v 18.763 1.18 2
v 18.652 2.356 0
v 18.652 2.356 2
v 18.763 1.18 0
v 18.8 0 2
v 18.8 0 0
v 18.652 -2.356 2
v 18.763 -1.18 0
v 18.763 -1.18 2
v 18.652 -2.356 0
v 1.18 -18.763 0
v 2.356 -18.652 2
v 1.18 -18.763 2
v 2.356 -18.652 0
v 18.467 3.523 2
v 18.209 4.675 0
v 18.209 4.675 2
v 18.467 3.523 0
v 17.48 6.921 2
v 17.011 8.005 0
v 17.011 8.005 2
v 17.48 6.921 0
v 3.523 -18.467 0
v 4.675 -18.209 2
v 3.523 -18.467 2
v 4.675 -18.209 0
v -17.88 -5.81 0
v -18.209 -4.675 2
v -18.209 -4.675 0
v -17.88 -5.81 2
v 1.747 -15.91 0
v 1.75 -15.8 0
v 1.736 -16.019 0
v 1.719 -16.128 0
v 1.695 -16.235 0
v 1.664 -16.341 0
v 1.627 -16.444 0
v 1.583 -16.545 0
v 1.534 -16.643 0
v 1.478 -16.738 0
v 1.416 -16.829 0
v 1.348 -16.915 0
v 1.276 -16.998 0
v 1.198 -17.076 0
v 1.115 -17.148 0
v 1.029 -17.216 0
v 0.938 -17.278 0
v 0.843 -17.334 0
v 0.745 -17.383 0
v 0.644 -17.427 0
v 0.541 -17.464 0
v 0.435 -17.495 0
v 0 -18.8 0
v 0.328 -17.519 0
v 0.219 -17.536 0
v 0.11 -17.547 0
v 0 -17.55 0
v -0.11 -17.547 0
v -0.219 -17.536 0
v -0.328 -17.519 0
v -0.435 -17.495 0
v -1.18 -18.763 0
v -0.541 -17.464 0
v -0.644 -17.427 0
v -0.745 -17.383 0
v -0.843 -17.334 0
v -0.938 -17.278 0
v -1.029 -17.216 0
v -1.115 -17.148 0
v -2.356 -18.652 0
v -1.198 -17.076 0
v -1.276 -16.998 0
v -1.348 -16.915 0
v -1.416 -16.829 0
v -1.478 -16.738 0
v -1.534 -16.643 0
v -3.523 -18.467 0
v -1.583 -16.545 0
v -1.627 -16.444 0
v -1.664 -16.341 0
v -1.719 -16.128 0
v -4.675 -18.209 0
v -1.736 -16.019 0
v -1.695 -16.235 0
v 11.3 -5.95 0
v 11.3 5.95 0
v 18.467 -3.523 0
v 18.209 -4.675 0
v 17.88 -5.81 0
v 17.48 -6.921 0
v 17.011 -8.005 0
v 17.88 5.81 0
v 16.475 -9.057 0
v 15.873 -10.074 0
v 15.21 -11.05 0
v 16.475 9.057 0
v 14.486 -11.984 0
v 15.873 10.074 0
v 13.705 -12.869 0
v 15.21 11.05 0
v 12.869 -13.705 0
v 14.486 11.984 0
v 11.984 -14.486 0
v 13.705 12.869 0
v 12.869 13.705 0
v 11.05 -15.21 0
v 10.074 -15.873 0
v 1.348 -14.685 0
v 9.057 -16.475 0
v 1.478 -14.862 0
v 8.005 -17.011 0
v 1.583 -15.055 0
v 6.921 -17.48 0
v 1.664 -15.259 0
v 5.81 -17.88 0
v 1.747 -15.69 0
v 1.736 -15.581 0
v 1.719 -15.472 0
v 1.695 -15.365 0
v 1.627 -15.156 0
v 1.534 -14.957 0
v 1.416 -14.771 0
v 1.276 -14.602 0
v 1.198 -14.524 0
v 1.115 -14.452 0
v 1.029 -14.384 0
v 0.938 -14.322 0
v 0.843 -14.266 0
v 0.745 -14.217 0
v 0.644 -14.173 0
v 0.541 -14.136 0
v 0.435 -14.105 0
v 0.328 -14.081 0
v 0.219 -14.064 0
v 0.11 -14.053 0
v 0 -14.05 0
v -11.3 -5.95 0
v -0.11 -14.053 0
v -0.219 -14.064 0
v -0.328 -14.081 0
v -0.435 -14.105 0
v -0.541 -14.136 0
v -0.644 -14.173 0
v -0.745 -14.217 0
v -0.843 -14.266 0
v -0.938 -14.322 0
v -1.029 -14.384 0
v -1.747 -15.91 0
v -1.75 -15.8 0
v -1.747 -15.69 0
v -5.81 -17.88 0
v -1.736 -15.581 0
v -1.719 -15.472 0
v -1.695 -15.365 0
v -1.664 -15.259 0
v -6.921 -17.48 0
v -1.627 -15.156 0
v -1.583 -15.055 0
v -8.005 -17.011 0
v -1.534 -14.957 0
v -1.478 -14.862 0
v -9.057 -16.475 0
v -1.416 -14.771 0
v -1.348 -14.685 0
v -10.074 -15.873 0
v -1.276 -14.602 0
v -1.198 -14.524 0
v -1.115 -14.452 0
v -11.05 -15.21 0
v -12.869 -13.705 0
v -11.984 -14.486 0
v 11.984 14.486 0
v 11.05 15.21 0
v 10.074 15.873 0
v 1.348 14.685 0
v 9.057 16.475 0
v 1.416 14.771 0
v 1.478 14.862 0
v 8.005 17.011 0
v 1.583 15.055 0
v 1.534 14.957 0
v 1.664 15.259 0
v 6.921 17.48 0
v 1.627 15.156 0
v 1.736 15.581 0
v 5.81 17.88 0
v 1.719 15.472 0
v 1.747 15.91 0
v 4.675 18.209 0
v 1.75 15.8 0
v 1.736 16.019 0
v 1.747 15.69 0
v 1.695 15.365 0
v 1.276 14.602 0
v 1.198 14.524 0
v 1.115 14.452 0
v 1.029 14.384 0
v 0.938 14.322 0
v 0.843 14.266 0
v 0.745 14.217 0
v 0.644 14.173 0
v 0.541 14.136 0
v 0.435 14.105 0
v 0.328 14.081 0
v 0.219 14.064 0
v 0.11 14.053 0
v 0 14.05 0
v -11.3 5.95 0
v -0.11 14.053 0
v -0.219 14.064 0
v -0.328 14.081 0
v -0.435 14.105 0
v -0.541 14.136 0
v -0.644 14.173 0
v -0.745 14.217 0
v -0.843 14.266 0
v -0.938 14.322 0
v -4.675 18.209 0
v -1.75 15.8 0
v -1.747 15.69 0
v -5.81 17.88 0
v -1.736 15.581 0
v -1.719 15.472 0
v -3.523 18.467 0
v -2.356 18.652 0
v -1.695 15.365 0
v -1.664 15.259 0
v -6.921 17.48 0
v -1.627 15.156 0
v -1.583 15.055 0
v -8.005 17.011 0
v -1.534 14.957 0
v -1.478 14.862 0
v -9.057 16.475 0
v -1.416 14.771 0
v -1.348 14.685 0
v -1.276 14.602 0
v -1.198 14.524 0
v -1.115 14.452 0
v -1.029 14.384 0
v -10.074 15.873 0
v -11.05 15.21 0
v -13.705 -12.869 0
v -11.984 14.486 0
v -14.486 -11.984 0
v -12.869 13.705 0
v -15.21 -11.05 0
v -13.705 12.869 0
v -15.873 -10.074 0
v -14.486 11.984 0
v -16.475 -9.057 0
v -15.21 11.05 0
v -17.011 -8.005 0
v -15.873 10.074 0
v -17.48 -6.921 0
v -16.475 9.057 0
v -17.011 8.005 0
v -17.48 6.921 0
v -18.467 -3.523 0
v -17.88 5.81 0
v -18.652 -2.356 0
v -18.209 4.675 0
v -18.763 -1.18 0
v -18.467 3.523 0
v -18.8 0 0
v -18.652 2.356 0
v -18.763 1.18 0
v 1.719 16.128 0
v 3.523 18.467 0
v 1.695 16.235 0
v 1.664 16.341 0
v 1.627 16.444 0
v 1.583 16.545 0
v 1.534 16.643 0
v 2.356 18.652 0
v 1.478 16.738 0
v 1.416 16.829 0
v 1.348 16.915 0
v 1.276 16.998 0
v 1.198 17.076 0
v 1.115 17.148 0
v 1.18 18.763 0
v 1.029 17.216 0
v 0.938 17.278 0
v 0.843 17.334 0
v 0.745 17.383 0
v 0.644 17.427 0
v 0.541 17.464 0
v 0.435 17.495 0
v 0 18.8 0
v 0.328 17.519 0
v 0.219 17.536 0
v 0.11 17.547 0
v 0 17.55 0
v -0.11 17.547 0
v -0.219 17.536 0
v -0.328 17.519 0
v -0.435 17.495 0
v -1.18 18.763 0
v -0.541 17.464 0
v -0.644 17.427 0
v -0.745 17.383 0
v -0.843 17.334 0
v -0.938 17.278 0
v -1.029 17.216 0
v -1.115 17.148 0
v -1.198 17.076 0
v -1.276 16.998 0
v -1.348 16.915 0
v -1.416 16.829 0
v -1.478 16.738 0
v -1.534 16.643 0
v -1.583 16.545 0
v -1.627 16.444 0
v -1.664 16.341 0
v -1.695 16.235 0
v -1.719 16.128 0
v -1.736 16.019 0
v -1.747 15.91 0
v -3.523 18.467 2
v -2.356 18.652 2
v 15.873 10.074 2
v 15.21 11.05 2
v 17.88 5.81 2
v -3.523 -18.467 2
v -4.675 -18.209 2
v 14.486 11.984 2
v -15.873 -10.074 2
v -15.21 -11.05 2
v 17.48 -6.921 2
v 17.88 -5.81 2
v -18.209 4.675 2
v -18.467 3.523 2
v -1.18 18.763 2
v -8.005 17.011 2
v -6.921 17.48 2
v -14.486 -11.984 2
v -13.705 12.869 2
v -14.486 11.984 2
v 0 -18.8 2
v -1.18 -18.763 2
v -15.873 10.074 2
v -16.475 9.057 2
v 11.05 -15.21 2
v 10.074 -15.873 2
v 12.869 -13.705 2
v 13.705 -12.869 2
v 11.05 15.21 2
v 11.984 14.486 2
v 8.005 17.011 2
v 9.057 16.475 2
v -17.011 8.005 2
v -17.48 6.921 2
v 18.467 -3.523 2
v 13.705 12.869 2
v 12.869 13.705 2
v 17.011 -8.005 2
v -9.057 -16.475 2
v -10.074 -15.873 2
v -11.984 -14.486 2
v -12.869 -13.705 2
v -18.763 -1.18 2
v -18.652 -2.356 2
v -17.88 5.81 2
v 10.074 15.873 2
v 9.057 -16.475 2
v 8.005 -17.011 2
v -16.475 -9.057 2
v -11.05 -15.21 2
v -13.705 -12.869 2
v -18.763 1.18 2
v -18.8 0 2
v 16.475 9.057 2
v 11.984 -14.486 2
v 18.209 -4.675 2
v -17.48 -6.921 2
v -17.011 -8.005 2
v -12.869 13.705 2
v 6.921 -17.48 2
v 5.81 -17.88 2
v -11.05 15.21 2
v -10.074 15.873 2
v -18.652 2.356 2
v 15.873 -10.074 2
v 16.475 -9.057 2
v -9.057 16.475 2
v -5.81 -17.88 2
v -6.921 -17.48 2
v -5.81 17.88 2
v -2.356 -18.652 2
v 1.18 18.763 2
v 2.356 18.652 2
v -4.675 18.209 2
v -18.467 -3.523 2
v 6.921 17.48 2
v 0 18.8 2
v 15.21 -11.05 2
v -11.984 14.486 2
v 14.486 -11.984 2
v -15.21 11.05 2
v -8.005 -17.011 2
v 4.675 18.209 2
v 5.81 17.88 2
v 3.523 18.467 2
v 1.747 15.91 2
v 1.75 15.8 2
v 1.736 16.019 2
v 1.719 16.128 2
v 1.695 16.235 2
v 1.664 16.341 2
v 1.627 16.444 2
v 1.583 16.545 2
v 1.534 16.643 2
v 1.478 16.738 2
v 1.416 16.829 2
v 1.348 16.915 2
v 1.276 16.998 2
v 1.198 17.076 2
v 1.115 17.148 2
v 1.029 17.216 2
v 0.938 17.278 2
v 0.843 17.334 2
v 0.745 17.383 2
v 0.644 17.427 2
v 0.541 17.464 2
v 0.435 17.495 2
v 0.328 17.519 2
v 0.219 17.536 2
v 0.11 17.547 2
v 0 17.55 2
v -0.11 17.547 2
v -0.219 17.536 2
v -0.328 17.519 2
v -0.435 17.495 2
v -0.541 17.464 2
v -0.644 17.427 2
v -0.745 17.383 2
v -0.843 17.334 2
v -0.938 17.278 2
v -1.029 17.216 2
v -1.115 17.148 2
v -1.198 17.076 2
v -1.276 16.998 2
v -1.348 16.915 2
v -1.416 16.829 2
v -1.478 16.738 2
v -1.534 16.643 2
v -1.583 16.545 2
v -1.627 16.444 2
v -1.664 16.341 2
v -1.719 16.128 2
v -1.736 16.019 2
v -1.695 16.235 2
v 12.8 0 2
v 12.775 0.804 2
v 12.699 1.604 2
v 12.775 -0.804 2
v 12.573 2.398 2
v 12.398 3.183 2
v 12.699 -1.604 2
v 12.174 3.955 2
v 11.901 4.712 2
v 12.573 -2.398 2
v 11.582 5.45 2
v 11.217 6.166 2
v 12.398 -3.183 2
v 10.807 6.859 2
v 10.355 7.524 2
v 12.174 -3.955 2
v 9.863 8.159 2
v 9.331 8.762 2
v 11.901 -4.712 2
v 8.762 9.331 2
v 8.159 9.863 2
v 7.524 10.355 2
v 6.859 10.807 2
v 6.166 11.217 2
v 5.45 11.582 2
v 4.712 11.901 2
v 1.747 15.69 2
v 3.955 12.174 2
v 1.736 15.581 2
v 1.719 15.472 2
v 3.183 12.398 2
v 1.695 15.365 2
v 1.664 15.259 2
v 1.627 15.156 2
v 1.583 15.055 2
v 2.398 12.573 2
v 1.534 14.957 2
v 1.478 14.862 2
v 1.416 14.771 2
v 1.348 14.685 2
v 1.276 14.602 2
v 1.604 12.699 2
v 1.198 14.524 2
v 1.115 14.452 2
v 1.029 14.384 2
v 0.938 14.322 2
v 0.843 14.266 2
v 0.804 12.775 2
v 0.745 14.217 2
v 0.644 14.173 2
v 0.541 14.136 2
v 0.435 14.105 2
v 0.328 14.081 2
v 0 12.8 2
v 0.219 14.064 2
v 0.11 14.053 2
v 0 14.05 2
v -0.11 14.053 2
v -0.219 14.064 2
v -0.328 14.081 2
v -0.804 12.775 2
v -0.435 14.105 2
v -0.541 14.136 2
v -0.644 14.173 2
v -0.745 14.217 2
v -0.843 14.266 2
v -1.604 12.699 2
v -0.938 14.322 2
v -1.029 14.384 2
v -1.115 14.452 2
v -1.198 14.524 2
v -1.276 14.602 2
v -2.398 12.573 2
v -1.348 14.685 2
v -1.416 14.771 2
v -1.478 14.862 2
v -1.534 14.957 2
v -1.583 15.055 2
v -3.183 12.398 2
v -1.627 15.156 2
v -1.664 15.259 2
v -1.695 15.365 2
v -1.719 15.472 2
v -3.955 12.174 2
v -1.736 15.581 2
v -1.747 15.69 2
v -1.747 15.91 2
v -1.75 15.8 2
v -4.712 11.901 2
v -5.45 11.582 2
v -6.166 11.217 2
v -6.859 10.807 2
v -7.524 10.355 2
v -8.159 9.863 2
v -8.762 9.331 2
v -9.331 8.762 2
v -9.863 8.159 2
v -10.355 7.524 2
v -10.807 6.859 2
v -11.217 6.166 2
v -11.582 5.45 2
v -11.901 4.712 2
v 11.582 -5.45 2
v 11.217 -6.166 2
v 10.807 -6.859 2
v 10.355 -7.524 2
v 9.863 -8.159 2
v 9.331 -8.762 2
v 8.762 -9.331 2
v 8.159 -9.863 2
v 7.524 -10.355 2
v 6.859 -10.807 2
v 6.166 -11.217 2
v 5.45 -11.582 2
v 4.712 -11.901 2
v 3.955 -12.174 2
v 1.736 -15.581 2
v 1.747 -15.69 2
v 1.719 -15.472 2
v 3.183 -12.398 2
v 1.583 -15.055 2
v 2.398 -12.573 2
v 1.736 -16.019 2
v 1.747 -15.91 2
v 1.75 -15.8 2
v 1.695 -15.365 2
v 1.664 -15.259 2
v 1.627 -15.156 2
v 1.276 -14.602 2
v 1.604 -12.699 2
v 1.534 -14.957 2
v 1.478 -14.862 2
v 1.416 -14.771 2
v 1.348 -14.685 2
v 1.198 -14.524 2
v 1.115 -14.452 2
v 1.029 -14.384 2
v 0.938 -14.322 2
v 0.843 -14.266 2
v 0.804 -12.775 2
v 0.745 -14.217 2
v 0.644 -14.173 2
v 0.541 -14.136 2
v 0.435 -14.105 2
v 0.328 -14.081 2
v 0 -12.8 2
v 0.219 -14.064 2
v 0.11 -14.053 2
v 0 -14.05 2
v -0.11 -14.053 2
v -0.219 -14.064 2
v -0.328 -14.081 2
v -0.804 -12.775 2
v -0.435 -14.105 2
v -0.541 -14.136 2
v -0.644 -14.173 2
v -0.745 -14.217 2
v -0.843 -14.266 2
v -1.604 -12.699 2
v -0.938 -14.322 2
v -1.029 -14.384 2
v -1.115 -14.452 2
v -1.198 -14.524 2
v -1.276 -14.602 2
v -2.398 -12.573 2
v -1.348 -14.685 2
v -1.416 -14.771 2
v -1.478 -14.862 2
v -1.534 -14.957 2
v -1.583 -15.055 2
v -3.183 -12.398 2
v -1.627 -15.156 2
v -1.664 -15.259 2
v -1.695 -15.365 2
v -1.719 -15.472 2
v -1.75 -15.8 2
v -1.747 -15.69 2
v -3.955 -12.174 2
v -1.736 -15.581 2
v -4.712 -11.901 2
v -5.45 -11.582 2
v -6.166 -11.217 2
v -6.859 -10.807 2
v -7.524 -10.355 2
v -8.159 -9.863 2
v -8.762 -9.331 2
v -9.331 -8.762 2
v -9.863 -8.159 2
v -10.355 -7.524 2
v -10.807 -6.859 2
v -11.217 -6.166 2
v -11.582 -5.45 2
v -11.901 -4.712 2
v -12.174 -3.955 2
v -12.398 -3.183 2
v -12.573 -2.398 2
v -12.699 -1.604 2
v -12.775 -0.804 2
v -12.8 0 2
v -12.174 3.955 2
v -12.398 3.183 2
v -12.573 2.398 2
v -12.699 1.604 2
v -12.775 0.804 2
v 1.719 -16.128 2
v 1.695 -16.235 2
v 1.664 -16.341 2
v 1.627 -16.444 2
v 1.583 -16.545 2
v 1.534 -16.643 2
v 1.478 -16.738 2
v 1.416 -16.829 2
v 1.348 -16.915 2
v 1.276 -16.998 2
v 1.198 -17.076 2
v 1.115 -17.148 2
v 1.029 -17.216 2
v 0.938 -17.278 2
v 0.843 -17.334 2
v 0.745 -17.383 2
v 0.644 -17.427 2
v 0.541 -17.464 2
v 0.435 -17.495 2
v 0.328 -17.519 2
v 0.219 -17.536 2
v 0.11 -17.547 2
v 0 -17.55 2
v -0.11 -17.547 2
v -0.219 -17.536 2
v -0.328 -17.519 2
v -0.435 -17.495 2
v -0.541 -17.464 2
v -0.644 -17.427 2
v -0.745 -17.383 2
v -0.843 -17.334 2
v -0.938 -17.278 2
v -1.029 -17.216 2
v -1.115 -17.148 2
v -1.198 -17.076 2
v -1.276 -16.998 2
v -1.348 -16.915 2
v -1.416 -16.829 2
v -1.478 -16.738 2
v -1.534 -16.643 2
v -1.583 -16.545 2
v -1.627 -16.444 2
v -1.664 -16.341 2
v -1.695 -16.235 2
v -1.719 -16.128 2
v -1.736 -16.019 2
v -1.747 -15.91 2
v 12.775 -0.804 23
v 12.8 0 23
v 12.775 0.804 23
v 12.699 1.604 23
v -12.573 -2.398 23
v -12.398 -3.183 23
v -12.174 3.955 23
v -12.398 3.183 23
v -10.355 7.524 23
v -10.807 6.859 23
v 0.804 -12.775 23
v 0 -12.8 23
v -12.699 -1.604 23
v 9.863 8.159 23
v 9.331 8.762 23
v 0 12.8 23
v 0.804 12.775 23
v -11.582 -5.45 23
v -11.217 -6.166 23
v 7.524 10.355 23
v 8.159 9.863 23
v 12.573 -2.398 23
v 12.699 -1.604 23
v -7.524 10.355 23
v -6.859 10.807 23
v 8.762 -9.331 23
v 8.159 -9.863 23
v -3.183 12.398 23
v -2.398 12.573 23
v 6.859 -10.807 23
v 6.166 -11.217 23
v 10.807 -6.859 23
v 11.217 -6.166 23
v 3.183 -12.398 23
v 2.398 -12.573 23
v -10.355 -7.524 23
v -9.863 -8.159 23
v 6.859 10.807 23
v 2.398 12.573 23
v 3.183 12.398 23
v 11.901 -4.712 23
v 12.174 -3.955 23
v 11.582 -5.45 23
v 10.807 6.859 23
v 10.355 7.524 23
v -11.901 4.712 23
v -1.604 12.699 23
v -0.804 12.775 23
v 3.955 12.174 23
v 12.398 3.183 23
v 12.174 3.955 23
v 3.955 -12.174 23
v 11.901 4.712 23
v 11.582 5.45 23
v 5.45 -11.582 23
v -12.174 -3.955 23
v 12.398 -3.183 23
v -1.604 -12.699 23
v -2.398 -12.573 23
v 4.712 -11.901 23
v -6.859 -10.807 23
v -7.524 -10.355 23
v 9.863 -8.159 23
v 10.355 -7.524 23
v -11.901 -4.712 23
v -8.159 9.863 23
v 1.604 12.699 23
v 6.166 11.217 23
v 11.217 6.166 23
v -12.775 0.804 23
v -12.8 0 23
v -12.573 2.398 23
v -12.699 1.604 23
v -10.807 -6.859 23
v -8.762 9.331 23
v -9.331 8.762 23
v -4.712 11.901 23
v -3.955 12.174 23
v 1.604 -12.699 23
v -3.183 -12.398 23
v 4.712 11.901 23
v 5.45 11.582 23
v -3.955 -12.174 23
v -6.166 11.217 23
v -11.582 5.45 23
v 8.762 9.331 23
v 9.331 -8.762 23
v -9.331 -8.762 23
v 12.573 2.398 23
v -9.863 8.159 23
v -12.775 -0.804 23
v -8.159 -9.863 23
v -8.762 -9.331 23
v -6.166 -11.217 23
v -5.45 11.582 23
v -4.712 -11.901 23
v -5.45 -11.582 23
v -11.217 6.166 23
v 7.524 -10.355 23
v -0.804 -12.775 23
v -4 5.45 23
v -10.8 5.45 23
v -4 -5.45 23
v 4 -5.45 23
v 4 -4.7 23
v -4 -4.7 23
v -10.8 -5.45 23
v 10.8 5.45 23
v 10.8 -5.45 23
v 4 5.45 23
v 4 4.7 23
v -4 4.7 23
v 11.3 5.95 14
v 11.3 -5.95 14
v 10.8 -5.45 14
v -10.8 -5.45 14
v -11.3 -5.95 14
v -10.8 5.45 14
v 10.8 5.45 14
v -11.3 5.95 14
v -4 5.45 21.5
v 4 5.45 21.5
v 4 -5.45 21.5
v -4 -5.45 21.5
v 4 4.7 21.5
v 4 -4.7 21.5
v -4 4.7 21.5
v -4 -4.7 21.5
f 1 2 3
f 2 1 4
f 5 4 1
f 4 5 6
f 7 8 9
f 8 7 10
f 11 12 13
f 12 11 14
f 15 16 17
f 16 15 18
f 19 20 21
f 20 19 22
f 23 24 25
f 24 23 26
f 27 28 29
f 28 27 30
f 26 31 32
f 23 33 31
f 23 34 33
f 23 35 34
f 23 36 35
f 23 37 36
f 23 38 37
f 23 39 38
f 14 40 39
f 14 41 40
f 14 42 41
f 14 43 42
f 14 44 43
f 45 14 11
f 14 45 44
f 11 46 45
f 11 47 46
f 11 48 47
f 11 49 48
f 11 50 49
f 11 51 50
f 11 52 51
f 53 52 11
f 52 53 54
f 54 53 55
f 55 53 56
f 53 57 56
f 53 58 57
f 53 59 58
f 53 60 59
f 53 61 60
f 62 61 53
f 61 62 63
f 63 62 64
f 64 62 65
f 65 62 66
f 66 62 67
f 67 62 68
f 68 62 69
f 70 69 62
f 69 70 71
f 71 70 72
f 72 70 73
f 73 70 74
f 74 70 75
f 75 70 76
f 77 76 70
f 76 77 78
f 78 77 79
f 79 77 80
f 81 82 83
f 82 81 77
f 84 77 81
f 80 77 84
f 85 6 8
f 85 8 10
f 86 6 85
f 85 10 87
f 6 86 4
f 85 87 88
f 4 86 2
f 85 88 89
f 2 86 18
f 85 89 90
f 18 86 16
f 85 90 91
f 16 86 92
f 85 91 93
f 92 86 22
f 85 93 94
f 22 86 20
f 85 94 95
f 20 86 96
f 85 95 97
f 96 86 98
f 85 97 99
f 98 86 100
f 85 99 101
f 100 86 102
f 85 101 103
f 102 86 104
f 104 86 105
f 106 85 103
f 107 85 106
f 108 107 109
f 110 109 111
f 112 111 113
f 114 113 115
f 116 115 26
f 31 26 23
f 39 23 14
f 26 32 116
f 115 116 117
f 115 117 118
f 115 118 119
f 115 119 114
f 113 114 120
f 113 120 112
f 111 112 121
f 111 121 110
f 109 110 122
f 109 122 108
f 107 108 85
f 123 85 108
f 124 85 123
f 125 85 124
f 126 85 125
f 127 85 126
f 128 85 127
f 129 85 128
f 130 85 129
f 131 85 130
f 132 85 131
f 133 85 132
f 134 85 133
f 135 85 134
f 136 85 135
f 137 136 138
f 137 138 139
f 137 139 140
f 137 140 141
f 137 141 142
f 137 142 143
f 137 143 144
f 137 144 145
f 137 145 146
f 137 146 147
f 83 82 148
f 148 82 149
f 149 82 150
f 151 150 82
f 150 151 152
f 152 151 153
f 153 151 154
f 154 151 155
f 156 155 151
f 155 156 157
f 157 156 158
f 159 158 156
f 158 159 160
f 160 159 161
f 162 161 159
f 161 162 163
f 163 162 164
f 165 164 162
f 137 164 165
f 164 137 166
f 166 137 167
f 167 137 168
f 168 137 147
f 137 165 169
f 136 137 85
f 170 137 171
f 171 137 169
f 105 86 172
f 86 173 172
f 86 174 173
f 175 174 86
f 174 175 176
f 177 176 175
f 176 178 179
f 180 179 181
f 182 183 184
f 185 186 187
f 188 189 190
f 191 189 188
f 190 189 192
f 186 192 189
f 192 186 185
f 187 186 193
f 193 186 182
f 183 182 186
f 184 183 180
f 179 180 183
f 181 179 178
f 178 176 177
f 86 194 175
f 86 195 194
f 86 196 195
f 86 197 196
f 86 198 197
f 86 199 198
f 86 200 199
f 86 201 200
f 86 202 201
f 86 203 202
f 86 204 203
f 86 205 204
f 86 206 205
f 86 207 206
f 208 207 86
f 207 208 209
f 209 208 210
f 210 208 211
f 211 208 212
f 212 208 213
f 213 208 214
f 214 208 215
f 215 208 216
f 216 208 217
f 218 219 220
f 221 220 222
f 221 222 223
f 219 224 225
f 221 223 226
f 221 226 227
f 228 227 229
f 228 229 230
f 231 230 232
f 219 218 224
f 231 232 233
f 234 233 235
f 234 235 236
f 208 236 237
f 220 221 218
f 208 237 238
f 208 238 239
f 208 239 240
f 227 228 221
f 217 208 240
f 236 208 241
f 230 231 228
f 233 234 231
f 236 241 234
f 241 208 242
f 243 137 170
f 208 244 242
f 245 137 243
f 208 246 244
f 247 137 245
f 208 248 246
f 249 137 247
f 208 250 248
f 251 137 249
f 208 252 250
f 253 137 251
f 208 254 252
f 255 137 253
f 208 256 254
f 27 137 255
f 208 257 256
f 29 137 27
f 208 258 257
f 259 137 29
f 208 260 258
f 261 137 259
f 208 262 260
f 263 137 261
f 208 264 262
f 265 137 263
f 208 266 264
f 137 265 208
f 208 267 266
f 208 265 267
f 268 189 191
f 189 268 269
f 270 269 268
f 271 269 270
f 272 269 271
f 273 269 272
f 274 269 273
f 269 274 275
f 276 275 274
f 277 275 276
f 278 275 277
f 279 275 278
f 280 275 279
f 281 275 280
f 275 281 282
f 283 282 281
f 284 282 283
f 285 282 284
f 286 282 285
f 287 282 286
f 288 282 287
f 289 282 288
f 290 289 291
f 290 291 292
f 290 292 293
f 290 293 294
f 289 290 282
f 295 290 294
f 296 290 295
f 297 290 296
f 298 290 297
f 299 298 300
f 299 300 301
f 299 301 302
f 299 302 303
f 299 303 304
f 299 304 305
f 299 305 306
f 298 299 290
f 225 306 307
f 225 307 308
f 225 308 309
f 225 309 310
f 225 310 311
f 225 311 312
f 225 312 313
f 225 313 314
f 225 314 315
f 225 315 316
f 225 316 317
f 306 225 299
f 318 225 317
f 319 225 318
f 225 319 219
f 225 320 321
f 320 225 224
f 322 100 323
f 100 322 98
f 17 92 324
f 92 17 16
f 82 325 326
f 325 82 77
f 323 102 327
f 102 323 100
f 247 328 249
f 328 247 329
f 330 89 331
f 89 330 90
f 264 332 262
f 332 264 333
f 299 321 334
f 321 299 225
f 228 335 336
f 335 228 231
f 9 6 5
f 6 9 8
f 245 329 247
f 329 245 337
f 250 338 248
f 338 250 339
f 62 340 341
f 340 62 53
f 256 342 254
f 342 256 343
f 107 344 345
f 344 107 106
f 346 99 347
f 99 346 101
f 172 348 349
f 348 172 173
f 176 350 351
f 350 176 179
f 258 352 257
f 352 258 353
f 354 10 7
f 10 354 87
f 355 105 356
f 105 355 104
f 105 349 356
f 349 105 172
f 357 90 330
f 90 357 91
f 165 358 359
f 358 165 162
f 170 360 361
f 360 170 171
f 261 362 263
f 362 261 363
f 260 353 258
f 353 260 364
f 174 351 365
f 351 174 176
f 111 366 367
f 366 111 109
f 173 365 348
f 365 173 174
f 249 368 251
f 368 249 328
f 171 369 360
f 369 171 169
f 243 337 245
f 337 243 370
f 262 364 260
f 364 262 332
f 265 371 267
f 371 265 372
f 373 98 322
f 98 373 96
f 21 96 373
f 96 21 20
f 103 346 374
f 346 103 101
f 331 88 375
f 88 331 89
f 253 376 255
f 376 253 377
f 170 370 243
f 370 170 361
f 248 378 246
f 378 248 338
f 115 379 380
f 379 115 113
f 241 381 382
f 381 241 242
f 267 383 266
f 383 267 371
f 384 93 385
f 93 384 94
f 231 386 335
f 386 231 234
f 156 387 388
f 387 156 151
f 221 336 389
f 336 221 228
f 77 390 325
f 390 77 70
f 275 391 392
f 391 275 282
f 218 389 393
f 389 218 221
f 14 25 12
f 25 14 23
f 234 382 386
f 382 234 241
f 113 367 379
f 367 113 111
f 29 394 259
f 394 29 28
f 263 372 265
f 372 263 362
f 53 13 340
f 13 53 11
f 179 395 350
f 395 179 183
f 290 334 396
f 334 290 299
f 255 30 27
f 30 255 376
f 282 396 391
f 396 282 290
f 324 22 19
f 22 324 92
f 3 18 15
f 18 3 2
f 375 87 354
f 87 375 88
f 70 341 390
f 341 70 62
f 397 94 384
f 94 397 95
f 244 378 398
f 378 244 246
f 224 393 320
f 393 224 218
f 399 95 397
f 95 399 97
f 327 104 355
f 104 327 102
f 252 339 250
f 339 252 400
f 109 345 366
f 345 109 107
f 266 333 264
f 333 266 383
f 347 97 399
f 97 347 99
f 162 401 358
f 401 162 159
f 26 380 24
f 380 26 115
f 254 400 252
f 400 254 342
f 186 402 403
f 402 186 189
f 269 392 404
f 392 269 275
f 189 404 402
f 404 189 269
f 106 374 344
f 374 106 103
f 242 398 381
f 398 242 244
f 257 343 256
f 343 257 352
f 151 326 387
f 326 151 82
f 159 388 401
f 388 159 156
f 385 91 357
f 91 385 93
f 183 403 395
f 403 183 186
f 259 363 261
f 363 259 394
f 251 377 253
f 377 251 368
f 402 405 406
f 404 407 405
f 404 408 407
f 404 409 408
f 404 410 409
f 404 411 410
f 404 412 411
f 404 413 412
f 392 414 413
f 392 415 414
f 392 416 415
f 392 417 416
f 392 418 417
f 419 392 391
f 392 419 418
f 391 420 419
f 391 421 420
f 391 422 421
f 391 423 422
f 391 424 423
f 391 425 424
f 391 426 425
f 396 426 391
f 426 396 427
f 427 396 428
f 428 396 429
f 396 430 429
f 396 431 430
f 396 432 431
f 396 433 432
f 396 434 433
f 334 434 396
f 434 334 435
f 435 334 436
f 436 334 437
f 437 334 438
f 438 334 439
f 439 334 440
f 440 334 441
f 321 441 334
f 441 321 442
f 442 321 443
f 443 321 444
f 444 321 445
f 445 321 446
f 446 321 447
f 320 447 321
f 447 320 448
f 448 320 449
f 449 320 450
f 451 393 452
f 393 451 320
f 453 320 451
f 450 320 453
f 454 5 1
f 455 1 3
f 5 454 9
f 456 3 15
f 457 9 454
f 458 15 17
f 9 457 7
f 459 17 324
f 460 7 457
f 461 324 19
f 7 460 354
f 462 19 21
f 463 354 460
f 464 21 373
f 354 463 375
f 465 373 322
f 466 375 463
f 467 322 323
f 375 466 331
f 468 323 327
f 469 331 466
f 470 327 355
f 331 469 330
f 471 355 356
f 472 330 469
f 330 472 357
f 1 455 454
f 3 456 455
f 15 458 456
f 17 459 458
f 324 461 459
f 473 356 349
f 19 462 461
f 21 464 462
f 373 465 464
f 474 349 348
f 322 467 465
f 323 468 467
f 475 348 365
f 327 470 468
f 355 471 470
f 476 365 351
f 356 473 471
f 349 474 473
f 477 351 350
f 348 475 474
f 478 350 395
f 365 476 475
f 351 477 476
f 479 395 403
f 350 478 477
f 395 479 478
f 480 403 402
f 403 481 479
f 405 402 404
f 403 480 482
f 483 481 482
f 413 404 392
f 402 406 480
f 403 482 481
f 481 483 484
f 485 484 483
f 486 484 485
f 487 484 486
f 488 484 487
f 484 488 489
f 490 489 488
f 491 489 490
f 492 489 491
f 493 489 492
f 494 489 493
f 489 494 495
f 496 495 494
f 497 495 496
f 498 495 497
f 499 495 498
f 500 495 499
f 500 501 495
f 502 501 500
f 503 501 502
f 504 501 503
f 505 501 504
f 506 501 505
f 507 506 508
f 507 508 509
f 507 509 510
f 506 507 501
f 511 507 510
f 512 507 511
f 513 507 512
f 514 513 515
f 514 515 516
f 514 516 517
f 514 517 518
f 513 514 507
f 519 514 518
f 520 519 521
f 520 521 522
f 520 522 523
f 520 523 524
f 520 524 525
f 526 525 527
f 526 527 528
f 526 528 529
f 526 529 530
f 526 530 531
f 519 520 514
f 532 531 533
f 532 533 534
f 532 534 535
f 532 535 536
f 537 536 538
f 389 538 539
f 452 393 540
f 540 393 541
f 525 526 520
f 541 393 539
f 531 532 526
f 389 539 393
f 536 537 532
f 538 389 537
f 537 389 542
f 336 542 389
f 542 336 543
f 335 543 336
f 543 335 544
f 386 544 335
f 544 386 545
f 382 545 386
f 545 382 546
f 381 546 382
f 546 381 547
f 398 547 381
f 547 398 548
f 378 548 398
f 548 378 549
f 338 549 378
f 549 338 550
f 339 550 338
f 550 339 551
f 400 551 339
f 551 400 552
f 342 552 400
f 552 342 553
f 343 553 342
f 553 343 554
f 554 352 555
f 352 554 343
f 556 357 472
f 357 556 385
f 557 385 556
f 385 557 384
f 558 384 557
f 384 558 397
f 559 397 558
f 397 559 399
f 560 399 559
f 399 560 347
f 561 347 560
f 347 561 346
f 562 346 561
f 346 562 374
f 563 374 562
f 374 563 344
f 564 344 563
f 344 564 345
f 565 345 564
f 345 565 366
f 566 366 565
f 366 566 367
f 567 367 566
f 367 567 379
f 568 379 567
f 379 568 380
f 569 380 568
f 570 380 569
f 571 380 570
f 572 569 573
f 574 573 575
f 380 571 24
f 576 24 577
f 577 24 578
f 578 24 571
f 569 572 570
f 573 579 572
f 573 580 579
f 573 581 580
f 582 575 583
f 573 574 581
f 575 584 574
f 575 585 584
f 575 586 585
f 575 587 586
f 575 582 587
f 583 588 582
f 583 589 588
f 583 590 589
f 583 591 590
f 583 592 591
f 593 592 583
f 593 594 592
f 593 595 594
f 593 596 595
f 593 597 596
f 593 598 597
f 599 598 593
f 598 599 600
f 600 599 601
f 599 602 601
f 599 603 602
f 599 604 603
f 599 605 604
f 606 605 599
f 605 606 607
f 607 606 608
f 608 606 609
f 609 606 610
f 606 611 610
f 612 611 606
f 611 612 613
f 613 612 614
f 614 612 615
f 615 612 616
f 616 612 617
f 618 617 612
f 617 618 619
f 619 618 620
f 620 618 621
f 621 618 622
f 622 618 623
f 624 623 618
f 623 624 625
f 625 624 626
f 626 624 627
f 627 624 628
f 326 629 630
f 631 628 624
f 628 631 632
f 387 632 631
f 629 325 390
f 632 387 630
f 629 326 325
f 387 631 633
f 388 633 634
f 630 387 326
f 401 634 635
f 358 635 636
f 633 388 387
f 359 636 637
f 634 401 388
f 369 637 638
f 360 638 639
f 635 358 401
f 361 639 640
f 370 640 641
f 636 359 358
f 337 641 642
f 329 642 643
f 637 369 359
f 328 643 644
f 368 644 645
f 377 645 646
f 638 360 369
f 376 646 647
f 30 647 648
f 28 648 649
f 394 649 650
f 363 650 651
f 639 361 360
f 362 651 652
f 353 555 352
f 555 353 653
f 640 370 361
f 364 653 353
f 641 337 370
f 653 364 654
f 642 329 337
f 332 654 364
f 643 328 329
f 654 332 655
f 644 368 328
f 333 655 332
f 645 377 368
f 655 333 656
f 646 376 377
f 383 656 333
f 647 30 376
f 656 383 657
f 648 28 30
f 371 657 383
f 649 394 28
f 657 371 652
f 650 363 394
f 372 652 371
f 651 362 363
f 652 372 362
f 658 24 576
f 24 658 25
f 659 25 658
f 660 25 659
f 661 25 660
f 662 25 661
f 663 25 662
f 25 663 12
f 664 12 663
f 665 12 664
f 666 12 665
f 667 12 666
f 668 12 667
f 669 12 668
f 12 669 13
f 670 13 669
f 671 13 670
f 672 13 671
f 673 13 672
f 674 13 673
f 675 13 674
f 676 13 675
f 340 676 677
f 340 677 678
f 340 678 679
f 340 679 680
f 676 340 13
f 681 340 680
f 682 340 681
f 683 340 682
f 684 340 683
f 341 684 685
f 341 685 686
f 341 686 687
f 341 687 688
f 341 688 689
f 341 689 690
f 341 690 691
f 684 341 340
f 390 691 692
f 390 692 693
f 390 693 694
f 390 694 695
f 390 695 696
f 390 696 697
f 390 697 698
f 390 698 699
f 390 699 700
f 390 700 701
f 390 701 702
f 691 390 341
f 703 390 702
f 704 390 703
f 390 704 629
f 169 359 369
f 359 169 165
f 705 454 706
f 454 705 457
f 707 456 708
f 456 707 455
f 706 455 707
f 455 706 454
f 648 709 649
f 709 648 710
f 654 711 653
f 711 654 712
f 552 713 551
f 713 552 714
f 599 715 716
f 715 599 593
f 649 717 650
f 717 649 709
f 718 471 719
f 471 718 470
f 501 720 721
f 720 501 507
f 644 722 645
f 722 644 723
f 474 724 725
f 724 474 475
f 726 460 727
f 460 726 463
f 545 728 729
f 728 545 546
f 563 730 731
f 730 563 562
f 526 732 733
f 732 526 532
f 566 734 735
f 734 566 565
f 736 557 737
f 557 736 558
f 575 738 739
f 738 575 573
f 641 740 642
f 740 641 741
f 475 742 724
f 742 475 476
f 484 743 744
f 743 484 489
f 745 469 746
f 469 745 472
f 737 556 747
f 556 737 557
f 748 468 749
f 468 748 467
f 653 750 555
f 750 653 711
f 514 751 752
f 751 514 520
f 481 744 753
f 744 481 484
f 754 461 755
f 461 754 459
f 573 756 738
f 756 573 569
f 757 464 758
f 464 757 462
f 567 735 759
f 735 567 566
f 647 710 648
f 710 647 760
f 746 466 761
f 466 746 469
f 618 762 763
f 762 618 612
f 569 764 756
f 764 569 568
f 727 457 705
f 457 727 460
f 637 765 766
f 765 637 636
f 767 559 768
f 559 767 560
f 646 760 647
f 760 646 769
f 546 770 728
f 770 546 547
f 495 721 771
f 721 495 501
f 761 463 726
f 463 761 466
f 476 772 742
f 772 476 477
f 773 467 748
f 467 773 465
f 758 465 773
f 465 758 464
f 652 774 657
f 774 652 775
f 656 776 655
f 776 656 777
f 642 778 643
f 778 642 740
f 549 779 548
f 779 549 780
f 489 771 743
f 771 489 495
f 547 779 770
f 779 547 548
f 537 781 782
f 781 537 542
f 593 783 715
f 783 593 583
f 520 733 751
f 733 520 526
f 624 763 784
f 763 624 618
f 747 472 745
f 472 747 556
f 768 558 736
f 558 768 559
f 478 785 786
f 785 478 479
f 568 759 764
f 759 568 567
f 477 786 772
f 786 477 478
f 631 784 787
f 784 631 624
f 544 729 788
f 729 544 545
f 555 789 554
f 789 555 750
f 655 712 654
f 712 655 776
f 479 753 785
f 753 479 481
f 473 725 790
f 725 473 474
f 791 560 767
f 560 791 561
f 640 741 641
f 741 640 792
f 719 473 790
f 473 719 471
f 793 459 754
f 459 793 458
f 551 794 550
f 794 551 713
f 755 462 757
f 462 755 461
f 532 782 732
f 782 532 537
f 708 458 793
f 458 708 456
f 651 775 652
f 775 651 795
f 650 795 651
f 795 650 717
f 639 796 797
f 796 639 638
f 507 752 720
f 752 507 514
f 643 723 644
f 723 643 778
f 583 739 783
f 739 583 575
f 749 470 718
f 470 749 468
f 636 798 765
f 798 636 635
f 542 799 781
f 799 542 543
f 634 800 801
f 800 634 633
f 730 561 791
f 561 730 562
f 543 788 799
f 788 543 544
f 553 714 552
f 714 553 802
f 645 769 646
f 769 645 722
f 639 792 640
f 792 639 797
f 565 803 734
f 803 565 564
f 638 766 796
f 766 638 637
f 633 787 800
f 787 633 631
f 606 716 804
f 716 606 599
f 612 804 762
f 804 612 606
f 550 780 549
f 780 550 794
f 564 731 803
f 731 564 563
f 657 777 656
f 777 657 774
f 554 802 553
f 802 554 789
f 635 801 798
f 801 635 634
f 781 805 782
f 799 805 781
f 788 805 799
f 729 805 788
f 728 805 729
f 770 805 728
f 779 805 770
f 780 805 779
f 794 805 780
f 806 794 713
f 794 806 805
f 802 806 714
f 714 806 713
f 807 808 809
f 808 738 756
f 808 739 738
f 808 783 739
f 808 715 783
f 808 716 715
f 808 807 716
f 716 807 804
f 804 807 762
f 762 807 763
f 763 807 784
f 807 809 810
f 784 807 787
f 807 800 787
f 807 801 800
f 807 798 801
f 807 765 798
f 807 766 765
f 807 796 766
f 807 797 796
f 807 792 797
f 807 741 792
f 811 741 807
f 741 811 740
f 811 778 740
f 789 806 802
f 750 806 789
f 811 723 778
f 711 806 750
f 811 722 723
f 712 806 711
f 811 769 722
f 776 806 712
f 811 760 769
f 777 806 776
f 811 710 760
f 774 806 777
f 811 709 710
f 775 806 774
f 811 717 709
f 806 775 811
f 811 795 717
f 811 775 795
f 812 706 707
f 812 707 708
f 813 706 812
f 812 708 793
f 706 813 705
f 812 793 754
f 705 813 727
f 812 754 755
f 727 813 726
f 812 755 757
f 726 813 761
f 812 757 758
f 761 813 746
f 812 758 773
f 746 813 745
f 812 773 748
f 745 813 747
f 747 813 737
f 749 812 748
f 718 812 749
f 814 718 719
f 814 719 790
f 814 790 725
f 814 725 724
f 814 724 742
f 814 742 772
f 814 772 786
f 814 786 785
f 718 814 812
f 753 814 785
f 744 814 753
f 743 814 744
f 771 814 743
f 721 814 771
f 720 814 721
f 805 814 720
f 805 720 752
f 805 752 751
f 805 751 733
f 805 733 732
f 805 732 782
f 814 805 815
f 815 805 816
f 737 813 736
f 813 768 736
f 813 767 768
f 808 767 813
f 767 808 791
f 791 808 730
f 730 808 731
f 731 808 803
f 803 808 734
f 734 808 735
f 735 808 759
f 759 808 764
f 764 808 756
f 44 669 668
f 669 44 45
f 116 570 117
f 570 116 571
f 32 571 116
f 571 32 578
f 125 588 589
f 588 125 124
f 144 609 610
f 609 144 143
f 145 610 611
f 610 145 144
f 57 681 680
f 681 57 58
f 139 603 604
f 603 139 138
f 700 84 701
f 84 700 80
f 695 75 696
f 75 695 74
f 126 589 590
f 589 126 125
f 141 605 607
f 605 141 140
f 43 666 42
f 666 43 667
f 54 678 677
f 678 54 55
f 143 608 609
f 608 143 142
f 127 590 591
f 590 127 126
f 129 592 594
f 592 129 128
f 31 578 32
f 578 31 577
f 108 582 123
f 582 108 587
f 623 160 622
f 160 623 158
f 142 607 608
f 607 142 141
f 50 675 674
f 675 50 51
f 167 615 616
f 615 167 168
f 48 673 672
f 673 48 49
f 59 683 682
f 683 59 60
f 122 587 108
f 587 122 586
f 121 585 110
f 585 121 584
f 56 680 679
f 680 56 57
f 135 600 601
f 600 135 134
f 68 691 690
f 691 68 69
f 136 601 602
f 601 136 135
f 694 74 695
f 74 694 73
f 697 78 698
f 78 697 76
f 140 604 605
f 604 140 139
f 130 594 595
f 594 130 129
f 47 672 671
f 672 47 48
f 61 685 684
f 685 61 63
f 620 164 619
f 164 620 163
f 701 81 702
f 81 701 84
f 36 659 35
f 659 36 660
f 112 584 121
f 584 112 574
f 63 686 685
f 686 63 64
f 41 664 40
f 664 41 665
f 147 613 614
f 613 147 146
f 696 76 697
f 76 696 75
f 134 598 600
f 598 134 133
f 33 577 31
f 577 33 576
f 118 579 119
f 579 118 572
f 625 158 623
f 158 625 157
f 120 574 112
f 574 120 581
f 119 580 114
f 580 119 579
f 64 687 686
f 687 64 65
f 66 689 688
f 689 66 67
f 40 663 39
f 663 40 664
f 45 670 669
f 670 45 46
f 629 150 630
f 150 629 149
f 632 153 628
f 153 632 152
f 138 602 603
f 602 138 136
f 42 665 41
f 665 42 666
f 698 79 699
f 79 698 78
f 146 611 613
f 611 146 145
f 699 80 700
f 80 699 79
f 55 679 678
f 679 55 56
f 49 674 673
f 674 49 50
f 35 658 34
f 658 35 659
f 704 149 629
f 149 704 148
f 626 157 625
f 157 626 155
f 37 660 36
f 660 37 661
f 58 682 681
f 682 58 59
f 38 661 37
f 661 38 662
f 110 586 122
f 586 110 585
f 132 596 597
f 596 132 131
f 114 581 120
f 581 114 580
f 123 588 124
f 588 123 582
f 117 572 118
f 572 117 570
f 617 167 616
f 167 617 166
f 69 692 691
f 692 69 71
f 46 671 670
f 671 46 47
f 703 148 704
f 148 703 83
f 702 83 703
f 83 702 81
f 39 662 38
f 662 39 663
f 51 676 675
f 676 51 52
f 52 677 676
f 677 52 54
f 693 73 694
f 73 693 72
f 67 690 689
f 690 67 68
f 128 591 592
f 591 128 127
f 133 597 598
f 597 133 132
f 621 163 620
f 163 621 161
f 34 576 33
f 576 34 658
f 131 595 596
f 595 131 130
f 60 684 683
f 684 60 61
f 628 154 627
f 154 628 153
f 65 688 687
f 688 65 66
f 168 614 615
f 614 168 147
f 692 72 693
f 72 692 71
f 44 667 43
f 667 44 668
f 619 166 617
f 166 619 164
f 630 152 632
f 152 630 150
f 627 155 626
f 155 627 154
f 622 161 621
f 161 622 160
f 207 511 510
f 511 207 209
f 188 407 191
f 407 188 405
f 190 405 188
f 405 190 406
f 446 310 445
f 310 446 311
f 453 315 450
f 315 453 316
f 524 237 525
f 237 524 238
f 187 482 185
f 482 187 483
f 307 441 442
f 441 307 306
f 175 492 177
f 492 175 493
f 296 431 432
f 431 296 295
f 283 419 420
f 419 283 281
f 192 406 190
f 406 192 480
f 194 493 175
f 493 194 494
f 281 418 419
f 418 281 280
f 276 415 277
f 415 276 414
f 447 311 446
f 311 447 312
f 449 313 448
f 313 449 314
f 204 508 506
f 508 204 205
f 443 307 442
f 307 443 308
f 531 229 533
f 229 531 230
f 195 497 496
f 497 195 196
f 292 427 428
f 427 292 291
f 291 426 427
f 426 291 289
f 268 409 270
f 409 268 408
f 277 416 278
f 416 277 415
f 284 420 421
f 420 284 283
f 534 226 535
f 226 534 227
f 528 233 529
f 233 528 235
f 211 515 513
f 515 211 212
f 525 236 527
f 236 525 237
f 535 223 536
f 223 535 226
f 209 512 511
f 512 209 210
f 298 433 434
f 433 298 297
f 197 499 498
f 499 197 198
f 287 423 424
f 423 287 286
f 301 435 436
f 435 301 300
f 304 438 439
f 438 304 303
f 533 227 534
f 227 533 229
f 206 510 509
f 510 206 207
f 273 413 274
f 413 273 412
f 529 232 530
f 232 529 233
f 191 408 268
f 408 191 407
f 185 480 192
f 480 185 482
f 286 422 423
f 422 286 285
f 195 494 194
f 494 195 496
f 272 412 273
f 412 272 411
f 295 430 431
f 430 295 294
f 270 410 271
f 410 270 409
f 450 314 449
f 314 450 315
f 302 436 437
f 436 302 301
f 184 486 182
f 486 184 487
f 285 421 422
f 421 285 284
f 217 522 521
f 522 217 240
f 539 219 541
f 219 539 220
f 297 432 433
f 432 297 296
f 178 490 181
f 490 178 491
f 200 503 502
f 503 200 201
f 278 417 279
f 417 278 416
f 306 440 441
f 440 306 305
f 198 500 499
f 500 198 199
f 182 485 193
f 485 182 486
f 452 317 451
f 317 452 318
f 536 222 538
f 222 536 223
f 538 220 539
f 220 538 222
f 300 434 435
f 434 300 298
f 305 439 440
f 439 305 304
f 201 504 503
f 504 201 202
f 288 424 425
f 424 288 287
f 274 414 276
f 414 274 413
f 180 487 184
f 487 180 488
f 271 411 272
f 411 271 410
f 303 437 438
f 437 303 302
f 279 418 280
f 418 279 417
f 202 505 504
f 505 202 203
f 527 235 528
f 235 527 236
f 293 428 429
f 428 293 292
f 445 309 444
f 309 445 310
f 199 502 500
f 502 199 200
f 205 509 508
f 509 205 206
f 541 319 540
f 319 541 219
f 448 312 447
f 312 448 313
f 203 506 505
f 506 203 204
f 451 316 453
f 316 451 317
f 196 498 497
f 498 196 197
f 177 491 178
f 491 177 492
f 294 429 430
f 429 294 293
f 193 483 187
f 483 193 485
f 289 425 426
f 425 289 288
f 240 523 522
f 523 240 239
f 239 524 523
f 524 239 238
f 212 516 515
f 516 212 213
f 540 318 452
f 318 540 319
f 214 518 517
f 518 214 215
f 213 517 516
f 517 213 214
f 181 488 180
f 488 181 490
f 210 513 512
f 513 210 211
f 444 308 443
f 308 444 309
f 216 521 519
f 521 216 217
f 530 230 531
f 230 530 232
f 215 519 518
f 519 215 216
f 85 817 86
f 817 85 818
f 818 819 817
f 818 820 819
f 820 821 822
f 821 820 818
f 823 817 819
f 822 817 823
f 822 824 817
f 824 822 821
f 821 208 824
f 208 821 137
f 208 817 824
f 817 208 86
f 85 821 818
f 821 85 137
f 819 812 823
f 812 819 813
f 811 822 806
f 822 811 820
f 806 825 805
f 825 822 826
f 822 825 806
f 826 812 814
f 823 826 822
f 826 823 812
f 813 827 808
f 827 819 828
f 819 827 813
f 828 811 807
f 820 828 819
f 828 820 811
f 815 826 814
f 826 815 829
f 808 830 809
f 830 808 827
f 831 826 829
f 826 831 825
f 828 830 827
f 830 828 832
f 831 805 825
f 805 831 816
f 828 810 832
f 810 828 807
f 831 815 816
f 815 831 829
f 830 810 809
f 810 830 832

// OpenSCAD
// XT60/90 panel mount
// by Albert P
// Last updated: Jan 16, 2018

// Change number of faces
$fn = 100;

/// XT60 Dimensions
tol= 0.2;
xt60_height = 15.6 + tol;
xt60_width = 7.8 + tol;
xt60_length = 16.4 + tol;

xt90_height= 21.4 + tol;
xt90_width = 10.7 + tol;
xt90_length = 21.3 + tol;


// Choose part here
part = "xt90"; // "xt60" "xt90"

if (part == "xt60")
{
    
    xt_panel_mount(xt60_height, xt60_width, xt60_length);
    
}
else if (part == "xt90")
{
    xt_panel_mount(xt90_height,xt90_width,xt90_length);
}

module xt_panel_mount(xt_height, xt_width, xt_length, panel_thickness = 2, body_thickness = 4, panel_diameter = 12)
{
    // body_diameter is diameter larger than the main body for the panel front
    m3_diameter = 3.5;
    bolt_diameter = m3_diameter;    // Size of panel mounting screw
    lip_length = 8;
    lip_thickness = 1.5;
    difference()
    {
        union()
        {
            // Panel Circle
            cylinder(d = xt_height + body_thickness + panel_diameter, h = panel_thickness);
            // Main body
            cylinder(d = xt_height + body_thickness, h = xt_length + lip_thickness);
            
            
       }
       // XT cutouts
       translate([0,0,xt_length/2 - 0.1])
       
       // TEMP change to thing after
       %cube([xt_height,xt_width, xt_length], center = true);
       // Cutting out extra space for loose fit
       translate([0,0,xt_length/2 - 7.5])
       cube([xt_height + 1,xt_width + 1, xt_length], center = true);
       // cut out
       cube([xt_height, xt_width, xt_length *5],center = true);

      
       // Panel Screw cutouts
       for(x = [-1:1])  // mirrors cutout
       {
       translate([0,x *(xt_height + body_thickness + panel_diameter/2)/2,-0.1])
       cylinder(d = m3_diameter, h = body_thickness);
       }
    }
    // Lip for XT cutout
    difference()
    {
        translate([0,0,xt_length + lip_thickness/2])
        {
        cube([lip_length, xt_width, lip_thickness], center = true);
        

        }
        translate([0,0,xt_length + lip_thickness/2])
        cube([xt_height, xt_width-lip_thickness, lip_thickness +0.1], center = true);
       
    }
    
    echo("Body Drill Size = ",xt_height + body_thickness, "mm ", (xt_height + body_thickness )/25.4, "in");
}
